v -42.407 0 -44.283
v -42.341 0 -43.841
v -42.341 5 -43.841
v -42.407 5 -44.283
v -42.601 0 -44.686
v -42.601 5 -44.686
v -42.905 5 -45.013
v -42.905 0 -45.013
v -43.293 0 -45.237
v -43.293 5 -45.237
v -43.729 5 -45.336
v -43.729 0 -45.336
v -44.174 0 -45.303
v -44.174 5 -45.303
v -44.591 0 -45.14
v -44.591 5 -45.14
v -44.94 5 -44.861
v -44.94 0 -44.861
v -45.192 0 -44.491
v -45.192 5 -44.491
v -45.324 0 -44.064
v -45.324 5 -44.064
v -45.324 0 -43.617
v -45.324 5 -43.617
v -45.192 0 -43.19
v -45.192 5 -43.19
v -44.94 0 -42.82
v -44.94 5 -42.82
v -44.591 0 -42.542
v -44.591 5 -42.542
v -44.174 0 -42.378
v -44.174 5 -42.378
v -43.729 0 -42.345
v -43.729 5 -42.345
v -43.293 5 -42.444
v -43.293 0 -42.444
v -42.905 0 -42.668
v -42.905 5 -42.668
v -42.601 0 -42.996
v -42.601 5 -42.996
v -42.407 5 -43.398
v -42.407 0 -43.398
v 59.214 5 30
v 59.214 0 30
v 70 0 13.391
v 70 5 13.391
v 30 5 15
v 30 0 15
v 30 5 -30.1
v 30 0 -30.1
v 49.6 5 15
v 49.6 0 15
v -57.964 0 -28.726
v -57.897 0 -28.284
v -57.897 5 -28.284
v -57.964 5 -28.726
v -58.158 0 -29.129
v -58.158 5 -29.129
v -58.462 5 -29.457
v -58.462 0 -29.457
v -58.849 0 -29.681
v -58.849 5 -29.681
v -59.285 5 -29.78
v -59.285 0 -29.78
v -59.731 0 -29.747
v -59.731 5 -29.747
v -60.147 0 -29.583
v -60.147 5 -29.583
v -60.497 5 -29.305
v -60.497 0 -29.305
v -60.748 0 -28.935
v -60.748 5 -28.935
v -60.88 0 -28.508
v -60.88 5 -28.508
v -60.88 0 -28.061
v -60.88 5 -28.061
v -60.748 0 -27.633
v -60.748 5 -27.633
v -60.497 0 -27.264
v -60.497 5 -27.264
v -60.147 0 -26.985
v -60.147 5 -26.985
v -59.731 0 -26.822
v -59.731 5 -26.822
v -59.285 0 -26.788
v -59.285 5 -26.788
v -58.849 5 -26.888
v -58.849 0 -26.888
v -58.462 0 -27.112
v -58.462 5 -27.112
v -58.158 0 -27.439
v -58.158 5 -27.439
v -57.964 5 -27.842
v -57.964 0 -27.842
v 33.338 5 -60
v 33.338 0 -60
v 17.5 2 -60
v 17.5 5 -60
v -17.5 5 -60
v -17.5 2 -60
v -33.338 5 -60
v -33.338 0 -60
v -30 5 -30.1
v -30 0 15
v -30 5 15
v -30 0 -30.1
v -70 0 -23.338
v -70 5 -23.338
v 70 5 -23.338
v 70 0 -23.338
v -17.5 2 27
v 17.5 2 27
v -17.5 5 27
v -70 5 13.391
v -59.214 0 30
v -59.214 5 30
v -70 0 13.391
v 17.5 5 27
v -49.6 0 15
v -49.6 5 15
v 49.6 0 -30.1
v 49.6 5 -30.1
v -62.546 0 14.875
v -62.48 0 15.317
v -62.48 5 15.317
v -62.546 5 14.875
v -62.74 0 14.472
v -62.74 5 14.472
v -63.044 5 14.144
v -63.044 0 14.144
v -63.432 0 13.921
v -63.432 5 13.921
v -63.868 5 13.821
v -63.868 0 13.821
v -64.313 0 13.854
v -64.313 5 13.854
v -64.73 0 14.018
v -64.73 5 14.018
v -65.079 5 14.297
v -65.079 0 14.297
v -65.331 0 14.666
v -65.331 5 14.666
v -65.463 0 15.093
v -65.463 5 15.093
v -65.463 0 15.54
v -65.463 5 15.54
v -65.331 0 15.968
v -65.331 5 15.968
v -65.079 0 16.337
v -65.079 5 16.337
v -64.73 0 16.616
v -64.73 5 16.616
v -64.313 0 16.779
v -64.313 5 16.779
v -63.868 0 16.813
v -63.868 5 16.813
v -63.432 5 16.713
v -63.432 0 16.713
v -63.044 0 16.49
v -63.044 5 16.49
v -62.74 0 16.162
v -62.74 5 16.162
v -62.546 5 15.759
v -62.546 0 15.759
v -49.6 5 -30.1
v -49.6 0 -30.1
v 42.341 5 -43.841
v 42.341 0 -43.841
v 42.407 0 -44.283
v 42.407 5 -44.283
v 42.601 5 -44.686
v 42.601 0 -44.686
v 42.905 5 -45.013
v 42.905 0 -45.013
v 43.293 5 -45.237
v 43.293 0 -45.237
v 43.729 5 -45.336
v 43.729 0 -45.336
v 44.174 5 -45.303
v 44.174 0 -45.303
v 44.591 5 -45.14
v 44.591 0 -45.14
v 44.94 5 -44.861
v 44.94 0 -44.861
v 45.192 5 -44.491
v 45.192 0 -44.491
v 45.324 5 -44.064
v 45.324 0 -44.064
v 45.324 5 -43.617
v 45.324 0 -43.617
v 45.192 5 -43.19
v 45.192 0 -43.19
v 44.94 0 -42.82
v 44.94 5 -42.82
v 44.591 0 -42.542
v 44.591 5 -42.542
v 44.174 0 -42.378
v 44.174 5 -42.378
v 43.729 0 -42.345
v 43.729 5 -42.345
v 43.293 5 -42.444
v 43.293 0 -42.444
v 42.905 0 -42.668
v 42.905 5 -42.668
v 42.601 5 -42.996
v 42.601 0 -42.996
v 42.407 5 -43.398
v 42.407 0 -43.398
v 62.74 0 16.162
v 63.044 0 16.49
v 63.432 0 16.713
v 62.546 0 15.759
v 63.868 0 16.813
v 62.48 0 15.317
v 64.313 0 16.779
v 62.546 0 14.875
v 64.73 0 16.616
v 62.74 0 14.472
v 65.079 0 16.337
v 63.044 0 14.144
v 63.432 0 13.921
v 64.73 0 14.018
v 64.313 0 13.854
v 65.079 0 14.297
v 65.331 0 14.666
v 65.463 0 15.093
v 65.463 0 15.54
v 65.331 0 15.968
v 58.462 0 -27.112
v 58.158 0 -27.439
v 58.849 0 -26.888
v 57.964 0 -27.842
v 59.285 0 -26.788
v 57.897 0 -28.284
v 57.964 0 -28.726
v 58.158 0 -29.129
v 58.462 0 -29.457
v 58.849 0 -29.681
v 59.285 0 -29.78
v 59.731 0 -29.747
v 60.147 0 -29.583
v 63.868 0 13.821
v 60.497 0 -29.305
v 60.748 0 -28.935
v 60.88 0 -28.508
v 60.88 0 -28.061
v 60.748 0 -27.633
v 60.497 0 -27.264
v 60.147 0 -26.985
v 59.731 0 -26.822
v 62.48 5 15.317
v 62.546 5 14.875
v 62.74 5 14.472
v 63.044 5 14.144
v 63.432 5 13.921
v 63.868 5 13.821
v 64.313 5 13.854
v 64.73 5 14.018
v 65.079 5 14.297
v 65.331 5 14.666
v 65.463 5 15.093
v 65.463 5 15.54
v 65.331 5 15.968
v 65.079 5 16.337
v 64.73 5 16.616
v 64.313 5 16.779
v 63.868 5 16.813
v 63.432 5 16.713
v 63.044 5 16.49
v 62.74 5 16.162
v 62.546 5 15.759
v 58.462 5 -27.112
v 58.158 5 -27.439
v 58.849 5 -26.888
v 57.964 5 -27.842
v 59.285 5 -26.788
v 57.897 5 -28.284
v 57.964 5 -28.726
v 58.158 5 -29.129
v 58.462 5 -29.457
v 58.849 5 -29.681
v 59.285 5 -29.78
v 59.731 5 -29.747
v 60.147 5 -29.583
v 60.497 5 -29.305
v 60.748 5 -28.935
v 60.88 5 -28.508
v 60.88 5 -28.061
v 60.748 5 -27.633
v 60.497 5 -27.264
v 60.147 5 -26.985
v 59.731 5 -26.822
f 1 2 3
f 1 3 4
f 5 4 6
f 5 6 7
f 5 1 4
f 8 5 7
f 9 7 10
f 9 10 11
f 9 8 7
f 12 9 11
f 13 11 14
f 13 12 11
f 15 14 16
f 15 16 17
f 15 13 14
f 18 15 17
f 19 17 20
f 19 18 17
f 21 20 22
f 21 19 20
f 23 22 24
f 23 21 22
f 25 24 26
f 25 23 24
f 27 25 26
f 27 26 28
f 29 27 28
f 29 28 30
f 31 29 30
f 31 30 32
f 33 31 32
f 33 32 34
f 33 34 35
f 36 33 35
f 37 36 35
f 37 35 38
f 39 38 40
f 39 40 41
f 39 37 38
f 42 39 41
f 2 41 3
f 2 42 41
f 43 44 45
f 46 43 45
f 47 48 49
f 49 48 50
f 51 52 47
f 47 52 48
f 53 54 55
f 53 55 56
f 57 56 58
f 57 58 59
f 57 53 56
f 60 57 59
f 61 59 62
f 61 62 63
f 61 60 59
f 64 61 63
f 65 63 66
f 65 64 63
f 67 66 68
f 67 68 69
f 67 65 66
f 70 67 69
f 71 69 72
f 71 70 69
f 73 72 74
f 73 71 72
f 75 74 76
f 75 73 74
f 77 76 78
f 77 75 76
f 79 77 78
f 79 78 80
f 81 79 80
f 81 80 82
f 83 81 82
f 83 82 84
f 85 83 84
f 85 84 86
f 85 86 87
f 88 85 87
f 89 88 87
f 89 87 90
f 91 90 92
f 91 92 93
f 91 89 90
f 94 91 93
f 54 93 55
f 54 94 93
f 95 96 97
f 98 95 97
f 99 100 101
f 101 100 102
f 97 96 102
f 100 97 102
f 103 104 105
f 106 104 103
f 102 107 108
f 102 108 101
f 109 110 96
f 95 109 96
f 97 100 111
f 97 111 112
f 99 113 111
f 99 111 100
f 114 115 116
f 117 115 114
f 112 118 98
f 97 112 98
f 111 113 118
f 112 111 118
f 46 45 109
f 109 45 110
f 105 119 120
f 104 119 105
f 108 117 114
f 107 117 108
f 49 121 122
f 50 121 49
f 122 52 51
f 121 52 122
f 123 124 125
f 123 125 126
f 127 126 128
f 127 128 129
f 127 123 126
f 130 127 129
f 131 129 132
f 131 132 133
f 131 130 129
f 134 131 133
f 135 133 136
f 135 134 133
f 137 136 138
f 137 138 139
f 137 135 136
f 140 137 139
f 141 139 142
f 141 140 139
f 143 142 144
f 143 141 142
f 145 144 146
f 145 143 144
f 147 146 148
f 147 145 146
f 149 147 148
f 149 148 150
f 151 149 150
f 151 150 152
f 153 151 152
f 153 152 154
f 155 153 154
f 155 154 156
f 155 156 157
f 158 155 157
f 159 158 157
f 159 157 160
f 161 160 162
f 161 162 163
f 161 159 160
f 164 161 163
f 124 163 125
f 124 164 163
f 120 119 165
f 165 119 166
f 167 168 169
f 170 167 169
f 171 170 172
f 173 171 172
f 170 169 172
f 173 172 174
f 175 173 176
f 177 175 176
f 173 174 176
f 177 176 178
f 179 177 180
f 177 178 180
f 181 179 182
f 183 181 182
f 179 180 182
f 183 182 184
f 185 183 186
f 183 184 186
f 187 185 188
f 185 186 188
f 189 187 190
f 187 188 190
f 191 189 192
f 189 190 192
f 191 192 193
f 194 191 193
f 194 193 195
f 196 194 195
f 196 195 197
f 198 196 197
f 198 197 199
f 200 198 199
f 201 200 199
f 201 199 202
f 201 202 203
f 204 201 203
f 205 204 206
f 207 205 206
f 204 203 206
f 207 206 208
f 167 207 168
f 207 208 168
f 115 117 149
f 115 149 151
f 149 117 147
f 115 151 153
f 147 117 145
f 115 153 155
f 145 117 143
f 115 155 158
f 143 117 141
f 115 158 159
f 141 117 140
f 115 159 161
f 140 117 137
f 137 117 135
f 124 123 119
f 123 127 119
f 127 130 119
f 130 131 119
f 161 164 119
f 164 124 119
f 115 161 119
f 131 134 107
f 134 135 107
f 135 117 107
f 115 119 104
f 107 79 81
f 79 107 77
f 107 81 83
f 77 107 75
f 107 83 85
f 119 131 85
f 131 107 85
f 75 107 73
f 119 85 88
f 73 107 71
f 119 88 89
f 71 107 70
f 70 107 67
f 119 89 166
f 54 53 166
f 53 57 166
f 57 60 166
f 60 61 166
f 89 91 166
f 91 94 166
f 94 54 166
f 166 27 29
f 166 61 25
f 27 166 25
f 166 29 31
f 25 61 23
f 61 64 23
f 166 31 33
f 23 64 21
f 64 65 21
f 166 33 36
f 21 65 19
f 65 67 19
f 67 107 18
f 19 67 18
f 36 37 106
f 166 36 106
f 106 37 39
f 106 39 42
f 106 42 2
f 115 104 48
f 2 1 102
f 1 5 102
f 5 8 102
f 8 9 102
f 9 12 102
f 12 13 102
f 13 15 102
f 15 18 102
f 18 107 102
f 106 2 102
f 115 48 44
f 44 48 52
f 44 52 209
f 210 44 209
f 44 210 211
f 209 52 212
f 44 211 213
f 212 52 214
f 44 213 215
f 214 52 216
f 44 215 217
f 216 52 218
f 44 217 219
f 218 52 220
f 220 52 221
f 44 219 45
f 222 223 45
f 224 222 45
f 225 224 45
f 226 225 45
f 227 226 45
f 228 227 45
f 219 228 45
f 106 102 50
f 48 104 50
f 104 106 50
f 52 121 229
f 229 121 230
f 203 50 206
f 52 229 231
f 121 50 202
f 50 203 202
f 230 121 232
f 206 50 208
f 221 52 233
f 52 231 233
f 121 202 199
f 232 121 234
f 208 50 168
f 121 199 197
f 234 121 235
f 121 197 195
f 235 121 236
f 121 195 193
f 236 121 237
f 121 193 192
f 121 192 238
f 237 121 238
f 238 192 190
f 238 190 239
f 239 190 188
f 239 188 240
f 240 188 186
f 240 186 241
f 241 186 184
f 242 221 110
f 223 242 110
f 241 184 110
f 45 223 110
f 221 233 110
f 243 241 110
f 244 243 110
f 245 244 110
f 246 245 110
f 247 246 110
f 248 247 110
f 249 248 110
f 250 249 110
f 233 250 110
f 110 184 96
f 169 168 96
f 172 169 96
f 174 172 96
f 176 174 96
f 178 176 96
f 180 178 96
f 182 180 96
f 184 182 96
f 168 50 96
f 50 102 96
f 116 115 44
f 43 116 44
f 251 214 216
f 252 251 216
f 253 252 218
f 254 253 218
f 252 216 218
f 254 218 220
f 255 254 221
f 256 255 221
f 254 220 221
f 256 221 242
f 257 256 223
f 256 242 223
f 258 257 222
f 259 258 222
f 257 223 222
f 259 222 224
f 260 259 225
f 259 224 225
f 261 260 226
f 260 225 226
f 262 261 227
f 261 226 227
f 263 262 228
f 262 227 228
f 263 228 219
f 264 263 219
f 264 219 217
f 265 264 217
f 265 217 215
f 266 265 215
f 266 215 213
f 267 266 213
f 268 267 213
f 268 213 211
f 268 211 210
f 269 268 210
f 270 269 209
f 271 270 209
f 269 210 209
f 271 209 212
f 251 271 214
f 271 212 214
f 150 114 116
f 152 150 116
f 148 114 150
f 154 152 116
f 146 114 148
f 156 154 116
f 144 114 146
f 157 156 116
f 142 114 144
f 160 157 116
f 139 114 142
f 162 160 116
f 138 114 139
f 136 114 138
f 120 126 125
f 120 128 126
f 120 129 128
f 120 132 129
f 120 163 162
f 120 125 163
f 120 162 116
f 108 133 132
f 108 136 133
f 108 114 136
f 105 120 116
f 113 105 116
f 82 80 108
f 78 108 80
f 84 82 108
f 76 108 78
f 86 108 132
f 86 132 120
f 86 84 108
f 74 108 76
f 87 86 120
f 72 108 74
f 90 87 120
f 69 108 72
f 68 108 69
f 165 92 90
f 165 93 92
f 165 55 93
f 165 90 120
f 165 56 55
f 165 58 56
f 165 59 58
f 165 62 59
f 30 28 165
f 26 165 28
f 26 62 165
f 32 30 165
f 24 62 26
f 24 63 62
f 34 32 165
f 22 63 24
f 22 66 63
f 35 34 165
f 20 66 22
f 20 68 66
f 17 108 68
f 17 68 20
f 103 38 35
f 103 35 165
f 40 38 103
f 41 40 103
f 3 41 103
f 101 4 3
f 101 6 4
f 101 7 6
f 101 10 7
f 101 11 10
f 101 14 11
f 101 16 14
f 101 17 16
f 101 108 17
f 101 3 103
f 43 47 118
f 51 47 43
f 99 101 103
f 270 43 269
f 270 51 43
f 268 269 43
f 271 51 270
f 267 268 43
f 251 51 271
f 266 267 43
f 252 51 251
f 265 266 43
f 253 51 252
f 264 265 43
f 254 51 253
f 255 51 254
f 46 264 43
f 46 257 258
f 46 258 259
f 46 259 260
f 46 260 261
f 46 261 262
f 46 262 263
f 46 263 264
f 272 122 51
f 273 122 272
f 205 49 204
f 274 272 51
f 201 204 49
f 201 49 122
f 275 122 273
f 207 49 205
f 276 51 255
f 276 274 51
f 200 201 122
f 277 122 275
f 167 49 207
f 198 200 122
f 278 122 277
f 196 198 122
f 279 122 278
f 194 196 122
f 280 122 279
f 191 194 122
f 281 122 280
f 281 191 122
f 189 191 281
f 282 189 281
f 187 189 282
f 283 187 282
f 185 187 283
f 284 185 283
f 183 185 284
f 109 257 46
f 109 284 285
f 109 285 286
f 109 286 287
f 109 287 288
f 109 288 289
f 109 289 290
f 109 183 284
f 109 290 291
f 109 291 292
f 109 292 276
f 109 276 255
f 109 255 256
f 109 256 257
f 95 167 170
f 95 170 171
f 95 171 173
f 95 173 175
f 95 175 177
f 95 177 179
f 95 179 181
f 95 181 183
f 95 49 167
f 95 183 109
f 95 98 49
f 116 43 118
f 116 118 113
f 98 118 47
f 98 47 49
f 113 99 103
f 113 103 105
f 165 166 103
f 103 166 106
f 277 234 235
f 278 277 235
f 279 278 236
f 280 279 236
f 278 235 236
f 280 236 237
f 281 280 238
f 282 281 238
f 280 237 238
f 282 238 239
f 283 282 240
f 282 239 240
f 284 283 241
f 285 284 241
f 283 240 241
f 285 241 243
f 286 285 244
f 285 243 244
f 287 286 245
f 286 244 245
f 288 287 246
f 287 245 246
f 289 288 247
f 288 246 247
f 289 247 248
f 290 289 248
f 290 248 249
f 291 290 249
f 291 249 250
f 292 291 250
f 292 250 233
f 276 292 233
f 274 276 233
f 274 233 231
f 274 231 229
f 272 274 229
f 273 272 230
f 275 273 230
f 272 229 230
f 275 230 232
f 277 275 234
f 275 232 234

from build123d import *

# Parameters (mm, degrees)
SKETCH1_R           = 1.5
SKETCH1_W           = 19.6
SKETCH1_H           = 45.1
BOSS_EXTRUDE1_DEPTH = 5
SKETCH2_W           = 35
SKETCH2_H           = 87
CUT_EXTRUDE1_DEPTH  = 3


with BuildPart() as part:
    # Sketch1 → Boss-Extrude1 (new body)
    with BuildSketch(Plane(origin=(0, 0, 0), x_dir=(1, 0, 0), z_dir=(0, 1, 0))):
        Polygon((-59.213749531, -30), (-70, -13.390630812), (-70, 23.338095117), (-33.338095117, 60), (0, 60), (0, -30), align=None)
        with Locations((-43.840620434, 43.840620434)):
            Circle(SKETCH1_R, mode=Mode.SUBTRACT)
        with Locations((-59.39696962, 28.284271247)):
            Circle(SKETCH1_R, mode=Mode.SUBTRACT)
        with Locations((-63.979633983, -15.316867676)):
            Circle(SKETCH1_R, mode=Mode.SUBTRACT)
        with Locations((-39.8, 7.55)):
            Rectangle(SKETCH1_W, SKETCH1_H, mode=Mode.SUBTRACT)
    boss_extrude1 = extrude(amount=BOSS_EXTRUDE1_DEPTH)

    # Mirror1: Boss-Extrude1 across plane
    add(boss_extrude1.mirror(Plane(origin=(0, 5, 30), x_dir=(0, 0, 1), z_dir=(-1, 0, 0))))

    # Sketch2 → Cut-Extrude1 (cut)
    with BuildSketch(Plane(origin=(0, 5, 0), x_dir=(1, 0, 0), z_dir=(0, 1, 0))):
        with Locations((0, 16.5)):
            Rectangle(SKETCH2_W, SKETCH2_H)
    extrude(amount=-CUT_EXTRUDE1_DEPTH, mode=Mode.SUBTRACT)


solid = part.part
